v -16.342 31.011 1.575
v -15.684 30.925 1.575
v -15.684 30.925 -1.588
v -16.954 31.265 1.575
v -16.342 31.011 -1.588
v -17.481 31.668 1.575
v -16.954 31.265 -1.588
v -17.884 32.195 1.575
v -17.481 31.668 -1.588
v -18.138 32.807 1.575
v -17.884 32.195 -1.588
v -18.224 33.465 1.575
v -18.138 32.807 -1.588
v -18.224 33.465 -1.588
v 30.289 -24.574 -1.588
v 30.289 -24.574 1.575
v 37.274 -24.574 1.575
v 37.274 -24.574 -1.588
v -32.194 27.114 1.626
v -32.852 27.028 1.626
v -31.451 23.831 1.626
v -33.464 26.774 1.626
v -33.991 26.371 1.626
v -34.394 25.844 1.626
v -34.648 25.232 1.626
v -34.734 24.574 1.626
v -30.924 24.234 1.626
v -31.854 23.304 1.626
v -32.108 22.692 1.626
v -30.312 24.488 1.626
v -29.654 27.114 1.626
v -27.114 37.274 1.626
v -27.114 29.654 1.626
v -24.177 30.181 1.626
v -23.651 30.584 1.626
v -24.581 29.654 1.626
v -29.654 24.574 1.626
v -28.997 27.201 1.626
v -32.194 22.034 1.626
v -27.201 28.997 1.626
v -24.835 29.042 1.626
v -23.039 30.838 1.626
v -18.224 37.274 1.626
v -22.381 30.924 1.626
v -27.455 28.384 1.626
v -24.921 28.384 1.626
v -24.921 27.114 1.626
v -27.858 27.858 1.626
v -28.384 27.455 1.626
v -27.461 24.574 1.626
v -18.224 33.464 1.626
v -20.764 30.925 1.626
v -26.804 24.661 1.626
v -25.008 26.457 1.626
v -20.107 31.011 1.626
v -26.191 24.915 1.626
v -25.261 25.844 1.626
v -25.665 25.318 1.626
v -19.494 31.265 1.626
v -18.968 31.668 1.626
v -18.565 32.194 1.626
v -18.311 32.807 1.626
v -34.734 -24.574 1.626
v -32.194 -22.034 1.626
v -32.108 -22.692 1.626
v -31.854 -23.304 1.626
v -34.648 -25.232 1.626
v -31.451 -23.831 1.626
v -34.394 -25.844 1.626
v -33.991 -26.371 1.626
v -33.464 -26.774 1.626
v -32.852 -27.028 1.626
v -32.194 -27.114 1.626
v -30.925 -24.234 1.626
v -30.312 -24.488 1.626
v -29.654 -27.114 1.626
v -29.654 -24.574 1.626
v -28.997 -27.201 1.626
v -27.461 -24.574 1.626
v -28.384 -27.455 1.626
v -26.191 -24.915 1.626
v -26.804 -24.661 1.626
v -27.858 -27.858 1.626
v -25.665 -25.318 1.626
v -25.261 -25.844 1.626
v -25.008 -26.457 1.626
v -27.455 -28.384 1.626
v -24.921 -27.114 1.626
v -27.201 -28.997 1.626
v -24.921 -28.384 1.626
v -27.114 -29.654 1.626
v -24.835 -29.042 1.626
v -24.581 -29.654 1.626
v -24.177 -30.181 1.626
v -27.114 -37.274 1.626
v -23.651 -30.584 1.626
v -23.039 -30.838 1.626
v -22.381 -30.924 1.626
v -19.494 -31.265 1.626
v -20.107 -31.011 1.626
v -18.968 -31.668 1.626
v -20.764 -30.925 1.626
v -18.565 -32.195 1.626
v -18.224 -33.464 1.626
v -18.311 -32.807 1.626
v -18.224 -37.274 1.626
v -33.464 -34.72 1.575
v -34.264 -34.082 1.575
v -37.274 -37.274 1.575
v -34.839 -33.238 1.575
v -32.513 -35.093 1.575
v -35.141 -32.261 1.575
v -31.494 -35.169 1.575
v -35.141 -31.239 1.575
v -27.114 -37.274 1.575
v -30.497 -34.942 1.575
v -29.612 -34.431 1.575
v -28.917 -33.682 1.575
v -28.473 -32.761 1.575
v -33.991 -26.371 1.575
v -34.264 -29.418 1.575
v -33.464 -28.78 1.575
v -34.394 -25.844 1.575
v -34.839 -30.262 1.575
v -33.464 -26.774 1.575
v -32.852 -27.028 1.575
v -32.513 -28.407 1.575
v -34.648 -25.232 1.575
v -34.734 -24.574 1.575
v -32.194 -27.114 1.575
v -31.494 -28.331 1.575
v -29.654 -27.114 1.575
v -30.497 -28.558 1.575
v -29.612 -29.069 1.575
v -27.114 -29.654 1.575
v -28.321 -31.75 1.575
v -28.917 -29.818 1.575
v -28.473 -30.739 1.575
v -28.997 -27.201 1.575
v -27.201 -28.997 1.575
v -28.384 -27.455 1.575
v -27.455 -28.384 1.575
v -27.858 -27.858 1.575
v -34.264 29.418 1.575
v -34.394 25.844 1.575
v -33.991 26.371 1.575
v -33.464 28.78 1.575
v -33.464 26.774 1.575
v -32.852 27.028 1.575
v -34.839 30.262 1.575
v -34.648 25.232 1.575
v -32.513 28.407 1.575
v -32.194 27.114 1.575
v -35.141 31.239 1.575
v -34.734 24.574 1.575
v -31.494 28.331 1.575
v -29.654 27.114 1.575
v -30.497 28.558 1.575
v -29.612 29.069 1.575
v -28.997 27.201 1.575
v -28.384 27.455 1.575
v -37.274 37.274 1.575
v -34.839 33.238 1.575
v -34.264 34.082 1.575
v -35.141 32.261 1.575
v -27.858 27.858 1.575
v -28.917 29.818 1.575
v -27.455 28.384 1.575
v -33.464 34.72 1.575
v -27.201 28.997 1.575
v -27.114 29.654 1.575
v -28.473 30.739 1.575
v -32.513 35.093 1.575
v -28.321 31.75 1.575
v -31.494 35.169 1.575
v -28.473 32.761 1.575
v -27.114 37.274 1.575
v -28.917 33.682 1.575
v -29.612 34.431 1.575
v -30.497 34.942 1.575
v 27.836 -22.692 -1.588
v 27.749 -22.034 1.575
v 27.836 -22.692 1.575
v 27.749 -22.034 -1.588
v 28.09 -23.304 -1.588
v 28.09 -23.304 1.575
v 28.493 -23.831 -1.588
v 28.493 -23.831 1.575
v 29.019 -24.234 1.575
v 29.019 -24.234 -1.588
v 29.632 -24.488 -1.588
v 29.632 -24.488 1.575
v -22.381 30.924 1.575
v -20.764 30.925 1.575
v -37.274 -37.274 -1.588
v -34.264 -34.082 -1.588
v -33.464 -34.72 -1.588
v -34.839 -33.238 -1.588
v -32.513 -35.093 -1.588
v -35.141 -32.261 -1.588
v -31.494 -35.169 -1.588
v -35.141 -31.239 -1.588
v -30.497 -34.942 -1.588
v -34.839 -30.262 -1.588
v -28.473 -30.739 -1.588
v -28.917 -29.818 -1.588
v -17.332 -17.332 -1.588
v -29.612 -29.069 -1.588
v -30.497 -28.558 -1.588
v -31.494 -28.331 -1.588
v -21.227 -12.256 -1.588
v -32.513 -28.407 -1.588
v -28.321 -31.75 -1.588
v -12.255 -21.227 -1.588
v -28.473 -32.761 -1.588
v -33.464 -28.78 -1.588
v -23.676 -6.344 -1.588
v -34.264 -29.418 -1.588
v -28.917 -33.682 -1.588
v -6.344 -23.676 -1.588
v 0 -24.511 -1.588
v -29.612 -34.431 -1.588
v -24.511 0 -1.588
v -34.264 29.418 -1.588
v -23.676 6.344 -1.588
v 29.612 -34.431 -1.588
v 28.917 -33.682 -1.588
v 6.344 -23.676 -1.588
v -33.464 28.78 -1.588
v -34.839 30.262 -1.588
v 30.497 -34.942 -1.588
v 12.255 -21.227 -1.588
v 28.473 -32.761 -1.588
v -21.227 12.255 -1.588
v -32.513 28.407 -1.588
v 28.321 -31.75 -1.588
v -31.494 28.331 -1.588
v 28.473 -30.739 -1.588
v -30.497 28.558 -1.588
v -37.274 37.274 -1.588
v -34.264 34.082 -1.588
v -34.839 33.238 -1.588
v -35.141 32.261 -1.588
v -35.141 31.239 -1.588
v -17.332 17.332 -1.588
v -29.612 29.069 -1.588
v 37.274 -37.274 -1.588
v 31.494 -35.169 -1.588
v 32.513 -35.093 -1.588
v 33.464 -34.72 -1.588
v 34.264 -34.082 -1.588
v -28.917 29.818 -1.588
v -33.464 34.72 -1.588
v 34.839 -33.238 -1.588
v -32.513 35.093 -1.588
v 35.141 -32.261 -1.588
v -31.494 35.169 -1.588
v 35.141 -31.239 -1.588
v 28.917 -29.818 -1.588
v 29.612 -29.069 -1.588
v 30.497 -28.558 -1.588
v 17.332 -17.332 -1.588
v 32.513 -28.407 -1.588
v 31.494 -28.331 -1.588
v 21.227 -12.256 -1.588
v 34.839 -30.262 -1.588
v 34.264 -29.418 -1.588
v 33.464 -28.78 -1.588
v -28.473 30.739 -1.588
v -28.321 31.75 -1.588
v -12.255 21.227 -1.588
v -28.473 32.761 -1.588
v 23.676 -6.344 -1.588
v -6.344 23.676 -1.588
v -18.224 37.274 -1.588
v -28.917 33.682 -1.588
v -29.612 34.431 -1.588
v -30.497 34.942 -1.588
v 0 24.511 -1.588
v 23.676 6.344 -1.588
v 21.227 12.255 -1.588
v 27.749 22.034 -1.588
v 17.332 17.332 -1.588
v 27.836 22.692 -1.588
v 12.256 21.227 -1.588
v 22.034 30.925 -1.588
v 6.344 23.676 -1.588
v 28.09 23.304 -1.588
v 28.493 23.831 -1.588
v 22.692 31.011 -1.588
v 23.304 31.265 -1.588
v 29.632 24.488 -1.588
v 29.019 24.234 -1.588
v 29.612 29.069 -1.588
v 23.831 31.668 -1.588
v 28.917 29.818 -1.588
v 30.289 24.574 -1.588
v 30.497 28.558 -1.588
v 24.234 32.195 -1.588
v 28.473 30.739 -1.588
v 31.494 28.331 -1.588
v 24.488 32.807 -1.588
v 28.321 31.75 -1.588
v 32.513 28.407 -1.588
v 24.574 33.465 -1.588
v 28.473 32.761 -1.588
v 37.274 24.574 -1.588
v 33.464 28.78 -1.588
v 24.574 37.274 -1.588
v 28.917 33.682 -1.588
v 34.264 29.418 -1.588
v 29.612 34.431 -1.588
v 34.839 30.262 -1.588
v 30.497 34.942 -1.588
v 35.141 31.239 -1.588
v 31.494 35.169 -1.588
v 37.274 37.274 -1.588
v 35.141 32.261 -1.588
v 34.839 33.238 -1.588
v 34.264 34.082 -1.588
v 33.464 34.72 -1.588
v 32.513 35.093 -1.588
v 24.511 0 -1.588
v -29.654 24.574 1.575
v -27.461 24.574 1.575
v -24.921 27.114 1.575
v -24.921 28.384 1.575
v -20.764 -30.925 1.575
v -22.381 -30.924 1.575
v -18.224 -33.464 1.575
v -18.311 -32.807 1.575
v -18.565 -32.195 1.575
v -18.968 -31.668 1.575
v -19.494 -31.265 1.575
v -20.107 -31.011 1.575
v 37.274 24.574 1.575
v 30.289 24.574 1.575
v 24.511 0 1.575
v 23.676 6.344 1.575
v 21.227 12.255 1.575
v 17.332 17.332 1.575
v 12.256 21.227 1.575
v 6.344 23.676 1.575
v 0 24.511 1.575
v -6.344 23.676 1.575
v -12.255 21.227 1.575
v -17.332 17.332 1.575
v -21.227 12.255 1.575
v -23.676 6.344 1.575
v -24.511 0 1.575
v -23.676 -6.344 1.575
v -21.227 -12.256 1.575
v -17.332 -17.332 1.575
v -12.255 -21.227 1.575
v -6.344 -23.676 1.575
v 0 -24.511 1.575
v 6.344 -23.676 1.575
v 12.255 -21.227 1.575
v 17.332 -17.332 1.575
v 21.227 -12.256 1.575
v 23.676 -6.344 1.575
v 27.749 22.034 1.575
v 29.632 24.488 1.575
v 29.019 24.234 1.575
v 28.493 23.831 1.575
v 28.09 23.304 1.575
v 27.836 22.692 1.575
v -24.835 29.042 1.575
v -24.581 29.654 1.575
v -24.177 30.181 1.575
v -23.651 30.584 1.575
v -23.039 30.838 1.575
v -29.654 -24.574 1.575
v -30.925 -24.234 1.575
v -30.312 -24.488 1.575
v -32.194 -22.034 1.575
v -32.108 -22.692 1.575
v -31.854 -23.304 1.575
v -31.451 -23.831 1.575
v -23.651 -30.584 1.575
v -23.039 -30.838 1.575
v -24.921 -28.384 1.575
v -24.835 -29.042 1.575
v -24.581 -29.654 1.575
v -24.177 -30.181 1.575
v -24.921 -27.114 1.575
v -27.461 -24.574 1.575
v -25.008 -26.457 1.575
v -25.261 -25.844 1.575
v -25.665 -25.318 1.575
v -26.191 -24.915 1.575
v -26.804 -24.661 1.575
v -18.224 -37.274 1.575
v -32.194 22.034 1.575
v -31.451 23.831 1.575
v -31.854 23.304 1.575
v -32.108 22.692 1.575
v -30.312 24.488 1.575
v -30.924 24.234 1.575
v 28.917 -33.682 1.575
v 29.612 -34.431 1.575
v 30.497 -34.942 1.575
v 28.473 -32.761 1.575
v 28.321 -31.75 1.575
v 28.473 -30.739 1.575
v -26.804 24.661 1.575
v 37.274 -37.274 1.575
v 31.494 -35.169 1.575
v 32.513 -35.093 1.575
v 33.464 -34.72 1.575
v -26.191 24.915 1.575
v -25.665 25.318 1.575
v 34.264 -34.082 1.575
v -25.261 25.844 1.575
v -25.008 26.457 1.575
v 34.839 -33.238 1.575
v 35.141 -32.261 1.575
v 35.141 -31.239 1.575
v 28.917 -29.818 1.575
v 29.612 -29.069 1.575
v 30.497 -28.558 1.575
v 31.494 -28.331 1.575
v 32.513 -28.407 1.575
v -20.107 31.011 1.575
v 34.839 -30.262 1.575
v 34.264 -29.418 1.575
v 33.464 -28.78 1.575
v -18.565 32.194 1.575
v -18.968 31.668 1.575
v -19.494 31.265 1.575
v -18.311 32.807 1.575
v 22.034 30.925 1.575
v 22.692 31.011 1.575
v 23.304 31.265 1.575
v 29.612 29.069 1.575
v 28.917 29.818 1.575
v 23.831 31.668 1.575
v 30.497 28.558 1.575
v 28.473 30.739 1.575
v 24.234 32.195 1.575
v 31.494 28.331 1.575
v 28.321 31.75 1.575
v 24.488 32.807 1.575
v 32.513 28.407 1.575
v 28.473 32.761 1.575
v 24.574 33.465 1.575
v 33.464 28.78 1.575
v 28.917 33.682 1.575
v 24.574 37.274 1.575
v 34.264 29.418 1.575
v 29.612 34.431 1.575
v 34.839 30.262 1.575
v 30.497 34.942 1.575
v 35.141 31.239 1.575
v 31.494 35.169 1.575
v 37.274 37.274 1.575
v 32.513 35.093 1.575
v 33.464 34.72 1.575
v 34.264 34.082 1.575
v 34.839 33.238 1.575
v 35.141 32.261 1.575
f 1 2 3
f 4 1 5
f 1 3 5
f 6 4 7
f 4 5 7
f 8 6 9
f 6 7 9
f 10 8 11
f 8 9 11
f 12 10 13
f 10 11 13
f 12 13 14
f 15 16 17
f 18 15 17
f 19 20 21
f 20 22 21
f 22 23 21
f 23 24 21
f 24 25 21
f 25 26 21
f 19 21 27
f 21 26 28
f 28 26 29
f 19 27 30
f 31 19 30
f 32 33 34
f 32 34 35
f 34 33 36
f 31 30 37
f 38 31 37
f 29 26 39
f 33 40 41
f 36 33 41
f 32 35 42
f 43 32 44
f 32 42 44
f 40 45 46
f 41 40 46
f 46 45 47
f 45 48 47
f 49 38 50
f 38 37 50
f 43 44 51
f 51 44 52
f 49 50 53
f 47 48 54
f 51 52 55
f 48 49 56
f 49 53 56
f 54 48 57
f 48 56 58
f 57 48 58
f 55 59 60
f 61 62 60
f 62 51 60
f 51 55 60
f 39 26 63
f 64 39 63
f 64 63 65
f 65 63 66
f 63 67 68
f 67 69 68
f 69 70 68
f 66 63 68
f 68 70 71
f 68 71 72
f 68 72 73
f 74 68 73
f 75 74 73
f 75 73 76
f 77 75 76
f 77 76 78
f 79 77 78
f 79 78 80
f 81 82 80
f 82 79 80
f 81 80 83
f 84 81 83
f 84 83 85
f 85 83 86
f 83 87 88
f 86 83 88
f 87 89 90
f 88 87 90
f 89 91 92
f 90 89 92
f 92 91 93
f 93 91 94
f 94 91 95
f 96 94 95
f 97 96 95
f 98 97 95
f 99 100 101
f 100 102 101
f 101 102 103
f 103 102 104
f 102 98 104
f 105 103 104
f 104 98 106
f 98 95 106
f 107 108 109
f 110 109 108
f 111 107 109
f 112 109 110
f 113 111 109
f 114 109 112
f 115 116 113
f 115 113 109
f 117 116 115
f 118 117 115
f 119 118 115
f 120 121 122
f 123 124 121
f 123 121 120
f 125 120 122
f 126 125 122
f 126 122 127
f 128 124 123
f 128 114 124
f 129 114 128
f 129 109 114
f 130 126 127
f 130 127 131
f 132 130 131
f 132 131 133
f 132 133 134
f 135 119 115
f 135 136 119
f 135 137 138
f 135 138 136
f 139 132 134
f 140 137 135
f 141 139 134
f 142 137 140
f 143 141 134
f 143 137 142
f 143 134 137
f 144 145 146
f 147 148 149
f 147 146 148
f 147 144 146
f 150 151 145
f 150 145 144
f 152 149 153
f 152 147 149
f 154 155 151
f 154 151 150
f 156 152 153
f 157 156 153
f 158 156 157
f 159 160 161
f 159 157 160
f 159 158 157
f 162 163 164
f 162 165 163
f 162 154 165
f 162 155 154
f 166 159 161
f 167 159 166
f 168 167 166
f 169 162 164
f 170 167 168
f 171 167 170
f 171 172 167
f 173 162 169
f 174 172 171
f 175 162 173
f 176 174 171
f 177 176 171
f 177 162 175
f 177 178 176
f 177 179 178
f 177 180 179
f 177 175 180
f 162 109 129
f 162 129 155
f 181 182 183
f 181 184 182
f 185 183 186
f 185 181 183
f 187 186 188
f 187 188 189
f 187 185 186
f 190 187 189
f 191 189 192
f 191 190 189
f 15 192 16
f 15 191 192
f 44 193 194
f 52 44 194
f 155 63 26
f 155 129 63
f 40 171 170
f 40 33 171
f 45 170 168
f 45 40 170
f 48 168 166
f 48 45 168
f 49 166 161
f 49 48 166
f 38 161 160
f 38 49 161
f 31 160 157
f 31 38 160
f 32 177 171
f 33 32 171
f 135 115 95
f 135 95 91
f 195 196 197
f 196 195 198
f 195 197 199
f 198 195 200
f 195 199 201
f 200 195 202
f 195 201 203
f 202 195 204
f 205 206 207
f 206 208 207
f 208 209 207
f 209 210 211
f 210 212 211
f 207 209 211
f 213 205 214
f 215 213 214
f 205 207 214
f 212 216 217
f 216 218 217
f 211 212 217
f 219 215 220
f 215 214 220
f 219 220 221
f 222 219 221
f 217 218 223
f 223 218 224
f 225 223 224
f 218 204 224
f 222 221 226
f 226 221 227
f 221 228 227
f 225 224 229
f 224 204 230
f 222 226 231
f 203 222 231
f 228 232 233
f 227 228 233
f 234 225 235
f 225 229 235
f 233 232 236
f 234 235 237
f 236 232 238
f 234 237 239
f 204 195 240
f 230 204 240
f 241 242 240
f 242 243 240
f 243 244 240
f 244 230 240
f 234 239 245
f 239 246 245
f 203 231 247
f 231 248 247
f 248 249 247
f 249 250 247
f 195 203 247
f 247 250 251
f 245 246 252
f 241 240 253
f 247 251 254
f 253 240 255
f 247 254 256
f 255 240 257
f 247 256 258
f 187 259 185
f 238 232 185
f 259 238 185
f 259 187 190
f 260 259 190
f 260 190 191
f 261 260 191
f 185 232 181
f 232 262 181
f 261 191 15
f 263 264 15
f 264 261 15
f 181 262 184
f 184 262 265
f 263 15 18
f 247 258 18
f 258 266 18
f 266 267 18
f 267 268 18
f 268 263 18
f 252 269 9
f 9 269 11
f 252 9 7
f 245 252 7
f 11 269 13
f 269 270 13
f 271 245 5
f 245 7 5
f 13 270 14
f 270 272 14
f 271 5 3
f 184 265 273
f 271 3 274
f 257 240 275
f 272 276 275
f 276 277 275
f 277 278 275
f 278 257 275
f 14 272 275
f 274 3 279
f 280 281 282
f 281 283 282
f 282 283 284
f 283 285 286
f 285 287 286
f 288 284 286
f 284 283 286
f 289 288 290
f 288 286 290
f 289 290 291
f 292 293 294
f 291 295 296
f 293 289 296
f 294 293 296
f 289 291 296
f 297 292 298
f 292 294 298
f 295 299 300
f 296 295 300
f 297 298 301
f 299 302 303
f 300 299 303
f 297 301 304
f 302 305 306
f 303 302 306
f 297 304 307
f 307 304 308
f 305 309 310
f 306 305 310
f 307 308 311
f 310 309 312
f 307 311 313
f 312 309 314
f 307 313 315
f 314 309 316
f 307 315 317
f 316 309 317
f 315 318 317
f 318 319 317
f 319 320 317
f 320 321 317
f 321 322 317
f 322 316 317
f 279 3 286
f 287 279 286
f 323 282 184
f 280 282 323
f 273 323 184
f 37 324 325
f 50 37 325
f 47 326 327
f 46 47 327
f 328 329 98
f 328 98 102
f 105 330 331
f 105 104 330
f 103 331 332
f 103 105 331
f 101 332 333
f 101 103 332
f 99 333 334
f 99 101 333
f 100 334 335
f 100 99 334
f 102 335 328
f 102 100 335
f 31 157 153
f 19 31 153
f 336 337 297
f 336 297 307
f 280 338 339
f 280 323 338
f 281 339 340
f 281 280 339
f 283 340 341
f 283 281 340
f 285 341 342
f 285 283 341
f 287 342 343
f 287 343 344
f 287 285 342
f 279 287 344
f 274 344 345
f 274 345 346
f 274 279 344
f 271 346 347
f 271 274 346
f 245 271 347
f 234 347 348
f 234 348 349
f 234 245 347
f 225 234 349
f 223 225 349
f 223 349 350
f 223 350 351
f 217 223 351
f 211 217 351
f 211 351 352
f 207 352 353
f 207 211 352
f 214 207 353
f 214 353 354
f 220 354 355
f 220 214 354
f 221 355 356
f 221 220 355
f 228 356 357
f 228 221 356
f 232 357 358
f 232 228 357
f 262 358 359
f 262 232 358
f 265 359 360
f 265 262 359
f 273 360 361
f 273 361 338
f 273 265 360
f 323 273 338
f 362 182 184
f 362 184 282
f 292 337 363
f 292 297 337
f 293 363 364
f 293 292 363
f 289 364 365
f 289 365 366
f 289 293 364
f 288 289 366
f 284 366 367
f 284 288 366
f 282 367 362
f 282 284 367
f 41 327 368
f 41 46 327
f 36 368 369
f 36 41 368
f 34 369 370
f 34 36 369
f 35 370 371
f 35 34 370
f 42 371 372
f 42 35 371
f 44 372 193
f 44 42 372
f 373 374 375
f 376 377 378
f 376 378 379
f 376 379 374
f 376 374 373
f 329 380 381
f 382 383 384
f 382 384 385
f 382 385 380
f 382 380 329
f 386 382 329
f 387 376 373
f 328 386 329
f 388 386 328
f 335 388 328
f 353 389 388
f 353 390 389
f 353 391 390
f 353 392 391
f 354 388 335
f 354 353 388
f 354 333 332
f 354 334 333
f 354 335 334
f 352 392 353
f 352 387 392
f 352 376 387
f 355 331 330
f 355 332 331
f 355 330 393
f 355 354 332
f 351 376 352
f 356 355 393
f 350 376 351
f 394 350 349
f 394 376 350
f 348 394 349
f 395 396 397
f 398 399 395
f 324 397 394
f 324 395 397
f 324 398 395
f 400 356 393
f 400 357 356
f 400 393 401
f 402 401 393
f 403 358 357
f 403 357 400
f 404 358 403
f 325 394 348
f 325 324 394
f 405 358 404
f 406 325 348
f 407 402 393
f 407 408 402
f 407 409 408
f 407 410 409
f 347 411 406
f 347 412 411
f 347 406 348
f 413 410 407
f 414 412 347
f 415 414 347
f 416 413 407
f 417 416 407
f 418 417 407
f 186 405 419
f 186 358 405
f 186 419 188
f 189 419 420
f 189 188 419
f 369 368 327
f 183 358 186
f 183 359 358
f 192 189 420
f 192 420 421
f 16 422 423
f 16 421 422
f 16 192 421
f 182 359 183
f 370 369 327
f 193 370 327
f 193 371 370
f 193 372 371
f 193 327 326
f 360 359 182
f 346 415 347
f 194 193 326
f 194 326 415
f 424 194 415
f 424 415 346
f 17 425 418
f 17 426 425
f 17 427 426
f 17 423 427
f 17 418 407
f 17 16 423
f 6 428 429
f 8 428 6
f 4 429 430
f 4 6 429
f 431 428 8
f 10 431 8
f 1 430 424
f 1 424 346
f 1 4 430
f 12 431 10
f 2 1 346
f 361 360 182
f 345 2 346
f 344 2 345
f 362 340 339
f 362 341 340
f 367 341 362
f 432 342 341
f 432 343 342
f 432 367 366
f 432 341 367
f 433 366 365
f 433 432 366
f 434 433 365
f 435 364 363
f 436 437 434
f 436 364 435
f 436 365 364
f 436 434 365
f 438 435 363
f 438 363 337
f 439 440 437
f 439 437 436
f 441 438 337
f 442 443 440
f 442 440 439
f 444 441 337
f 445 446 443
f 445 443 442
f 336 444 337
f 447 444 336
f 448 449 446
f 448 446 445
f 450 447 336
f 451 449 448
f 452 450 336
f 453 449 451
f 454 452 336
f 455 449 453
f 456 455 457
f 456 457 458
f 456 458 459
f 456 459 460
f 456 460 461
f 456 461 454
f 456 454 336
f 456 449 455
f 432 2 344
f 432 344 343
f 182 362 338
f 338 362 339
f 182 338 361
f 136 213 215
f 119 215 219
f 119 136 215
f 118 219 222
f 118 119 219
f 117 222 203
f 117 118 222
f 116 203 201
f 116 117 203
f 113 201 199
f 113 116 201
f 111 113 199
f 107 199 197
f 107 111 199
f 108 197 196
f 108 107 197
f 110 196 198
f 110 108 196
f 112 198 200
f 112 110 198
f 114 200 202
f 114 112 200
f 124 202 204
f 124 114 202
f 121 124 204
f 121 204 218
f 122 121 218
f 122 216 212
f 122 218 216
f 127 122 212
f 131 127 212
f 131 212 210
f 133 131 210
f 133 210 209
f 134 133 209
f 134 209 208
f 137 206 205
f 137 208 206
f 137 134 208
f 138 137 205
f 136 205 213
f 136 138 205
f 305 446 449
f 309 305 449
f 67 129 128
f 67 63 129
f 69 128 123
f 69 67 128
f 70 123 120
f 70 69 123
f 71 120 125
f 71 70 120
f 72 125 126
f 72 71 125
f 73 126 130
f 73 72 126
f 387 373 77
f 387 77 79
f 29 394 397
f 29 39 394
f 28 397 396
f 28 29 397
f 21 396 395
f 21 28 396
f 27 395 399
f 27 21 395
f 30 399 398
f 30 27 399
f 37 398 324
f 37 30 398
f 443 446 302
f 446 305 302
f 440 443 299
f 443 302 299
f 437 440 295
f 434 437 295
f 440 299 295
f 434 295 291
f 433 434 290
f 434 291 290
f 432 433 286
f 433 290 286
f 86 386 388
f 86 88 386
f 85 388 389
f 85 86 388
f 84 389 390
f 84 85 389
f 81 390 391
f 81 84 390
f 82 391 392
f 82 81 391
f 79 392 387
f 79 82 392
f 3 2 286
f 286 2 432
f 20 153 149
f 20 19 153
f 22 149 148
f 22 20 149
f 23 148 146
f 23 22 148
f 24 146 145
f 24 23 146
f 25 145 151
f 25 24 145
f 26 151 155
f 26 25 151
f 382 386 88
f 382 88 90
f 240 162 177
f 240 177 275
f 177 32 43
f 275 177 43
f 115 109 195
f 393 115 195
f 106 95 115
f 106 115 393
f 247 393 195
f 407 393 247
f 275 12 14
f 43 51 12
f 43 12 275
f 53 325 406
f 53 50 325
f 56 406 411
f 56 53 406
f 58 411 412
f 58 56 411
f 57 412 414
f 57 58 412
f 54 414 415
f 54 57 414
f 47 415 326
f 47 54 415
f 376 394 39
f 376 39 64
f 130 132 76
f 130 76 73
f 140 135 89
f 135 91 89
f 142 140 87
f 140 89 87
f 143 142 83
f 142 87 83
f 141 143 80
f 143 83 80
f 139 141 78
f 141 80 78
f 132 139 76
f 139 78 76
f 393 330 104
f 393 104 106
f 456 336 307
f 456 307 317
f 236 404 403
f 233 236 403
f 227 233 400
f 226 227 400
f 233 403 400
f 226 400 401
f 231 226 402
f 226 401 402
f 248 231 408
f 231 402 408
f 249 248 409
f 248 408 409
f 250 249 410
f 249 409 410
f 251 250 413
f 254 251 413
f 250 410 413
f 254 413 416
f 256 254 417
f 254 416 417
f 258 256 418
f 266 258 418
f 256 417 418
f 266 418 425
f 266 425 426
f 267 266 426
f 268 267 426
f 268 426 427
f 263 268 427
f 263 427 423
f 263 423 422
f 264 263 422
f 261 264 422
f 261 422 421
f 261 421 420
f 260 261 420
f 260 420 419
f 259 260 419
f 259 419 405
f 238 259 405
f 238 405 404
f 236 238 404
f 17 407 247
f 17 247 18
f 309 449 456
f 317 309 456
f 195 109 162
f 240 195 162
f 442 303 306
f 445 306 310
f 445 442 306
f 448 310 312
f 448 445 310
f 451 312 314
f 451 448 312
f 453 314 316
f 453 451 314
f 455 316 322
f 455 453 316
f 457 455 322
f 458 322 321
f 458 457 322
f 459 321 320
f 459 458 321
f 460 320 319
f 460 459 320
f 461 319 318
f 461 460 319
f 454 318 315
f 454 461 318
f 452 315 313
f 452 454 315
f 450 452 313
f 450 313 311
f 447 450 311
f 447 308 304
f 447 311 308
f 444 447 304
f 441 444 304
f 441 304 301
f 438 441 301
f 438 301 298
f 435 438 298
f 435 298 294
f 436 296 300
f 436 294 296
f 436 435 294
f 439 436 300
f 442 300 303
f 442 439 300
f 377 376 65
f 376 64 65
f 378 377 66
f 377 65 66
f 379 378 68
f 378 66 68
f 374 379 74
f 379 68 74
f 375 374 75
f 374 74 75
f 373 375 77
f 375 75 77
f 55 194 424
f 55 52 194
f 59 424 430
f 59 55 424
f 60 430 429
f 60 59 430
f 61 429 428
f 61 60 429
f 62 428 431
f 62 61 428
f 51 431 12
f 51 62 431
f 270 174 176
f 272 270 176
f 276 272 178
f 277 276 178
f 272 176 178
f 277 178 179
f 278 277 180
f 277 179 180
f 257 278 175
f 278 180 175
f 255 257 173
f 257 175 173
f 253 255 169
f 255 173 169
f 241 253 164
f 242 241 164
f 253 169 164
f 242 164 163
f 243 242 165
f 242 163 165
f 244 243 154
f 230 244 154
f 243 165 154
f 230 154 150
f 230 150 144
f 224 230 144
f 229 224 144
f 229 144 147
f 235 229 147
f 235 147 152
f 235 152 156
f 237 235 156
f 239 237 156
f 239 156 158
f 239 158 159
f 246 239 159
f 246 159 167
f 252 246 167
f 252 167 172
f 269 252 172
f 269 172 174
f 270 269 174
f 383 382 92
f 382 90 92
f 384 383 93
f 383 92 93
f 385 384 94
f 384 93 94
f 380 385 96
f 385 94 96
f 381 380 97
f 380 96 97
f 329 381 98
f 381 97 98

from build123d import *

# Parameters (mm, degrees)
SKETCH1_W                = 74.549
SKETCH1_H                = 74.549
SKETCH1_R                = 24.511
BOSS_EXTRUDE1_DEPTH      = 1.5748
BOSS_EXTRUDE1_DEPTH_BACK = 1.5875
SKETCH2_R                = 3.429
CUT_EXTRUDE1_DEPTH       = 4.1623
BOSS_EXTRUDE2_DEPTH      = 0.0508
FILLET3_R                = 2.54
FILLET3_OF_MIRROR3_R     = 2.54
MIRROR2_COPY_1_SKETCH_R  = 3.429
MIRROR2_COPY_1_DEPTH     = 4.1623
SKETCH14_W               = 42.799
SKETCH14_H               = 8.290530285
CUT_EXTRUDE2_DEPTH       = 4.1623
FILLET1_R                = 2.54
SKETCH17_W               = 14.315330836
SKETCH17_H               = 49.149
CUT_EXTRUDE3_DEPTH       = 4.1623
FILLET2_R                = 2.54
FILLET5_R                = 2.54


with BuildPart() as part:
    # Sketch1 → Boss-Extrude1 (new body, two sides)
    with BuildSketch(Plane.XY) as boss_extrude1_sk:
        Rectangle(SKETCH1_W, SKETCH1_H)
        Circle(SKETCH1_R, mode=Mode.SUBTRACT)
    extrude(amount=BOSS_EXTRUDE1_DEPTH)
    extrude(boss_extrude1_sk.sketch, amount=-BOSS_EXTRUDE1_DEPTH_BACK)

    # Sketch2 → Cut-Extrude1 (cut, through all)
    with BuildSketch(Plane.XY.offset(1.5748)):
        with Locations((-31.75, 31.75)):
            Circle(SKETCH2_R)
    cut_extrude1 = extrude(amount=-CUT_EXTRUDE1_DEPTH, mode=Mode.SUBTRACT)

    # Sketch20 → Boss-Extrude2 (add)
    with BuildSketch(Plane.XY.offset(1.5748)):
        Polygon((-24.921174252, 24.5745), (-24.921174252, 30.9245), (-18.2245, 30.9245), (-18.2245, 37.2745), (-27.1145, 37.2745), (-27.1145, 27.1145), (-34.7345, 27.1145), (-34.7345, 0), (-32.1945, 0), (-32.1945, 24.5745), align=None)
    boss_extrude2 = extrude(amount=BOSS_EXTRUDE2_DEPTH)

    # Fillet3
    fillet3_edges = [part.edges().sort_by_distance(p)[0] for p in [
        (-34.7345, 27.1145, 1.6002),
        (-32.1945, 24.5745, 1.6002),
        (-18.2245, 30.9245, 1.6002),
        (-24.921174252, 24.5745, 1.6002),
        (-24.921174252, 30.9245, 1.6002),
    ]]
    fillet(fillet3_edges, radius=FILLET3_R)

    # Mirror3: Boss-Extrude2 across plane
    add(boss_extrude2.mirror(Plane.ZX))

    # Fillet3 of Mirror3
    fillet3_of_mirror3_edges = [part.edges().sort_by_distance(p)[0] for p in [
        (-34.7345, -27.1145, 1.6002),
        (-32.1945, -24.5745, 1.6002),
        (-18.2245, -30.9245, 1.6002),
        (-24.921174252, -24.5745, 1.6002),
        (-24.921174252, -30.9245, 1.6002),
    ]]
    fillet(fillet3_of_mirror3_edges, radius=FILLET3_OF_MIRROR3_R)

    # Mirror1: Cut-Extrude1 across plane
    add(cut_extrude1.mirror(Plane(origin=(0, 0, 0), x_dir=(0, 0, 1), z_dir=(1, 0, 0))), mode=Mode.SUBTRACT)

    # Mirror2: Cut-Extrude1 across plane
    add(cut_extrude1.mirror(Plane.ZX), mode=Mode.SUBTRACT)

    # Mirror2 copy 1 sketch → Mirror2 copy 1 (cut, through all)
    with BuildSketch(Plane(origin=(0, 0, 1.5748), x_dir=(-1, 0, 0), z_dir=(0, 0, 1))):
        with Locations((-31.75, 31.75)):
            Circle(MIRROR2_COPY_1_SKETCH_R)
    extrude(amount=-MIRROR2_COPY_1_DEPTH, mode=Mode.SUBTRACT)

    # Sketch14 → Cut-Extrude2 (cut, through all)
    with BuildSketch(Plane.XY.offset(1.5748)):
        with Locations((3.175, 35.069765143)):
            Rectangle(SKETCH14_W, SKETCH14_H)
    extrude(amount=-CUT_EXTRUDE2_DEPTH, mode=Mode.SUBTRACT)

    # Fillet1
    fillet1_edges = [part.edges().sort_by_distance(p)[0] for p in [
        (-18.2245, 30.9245, -0.00635),
        (24.5745, 30.9245, -0.00635),
    ]]
    fillet(fillet1_edges, radius=FILLET1_R)

    # Sketch17 → Cut-Extrude3 (cut, through all)
    with BuildSketch(Plane.XY.offset(1.5748)):
        with Locations((34.907165418, 0)):
            Rectangle(SKETCH17_W, SKETCH17_H)
    extrude(amount=-CUT_EXTRUDE3_DEPTH, mode=Mode.SUBTRACT)

    # Fillet2
    fillet2_edges = [part.edges().sort_by_distance(p)[0] for p in [
        (27.7495, -24.5745, -0.00635),
        (27.7495, 24.5745, -0.00635),
    ]]
    fillet(fillet2_edges, radius=FILLET2_R)

    # Fillet5
    fillet5_edges = [part.edges().sort_by_distance(p)[0] for p in [
        (-27.1145, -27.1145, 1.6002),
        (-27.1145, 27.1145, 1.6002),
    ]]
    fillet(fillet5_edges, radius=FILLET5_R)


solid = part.part
